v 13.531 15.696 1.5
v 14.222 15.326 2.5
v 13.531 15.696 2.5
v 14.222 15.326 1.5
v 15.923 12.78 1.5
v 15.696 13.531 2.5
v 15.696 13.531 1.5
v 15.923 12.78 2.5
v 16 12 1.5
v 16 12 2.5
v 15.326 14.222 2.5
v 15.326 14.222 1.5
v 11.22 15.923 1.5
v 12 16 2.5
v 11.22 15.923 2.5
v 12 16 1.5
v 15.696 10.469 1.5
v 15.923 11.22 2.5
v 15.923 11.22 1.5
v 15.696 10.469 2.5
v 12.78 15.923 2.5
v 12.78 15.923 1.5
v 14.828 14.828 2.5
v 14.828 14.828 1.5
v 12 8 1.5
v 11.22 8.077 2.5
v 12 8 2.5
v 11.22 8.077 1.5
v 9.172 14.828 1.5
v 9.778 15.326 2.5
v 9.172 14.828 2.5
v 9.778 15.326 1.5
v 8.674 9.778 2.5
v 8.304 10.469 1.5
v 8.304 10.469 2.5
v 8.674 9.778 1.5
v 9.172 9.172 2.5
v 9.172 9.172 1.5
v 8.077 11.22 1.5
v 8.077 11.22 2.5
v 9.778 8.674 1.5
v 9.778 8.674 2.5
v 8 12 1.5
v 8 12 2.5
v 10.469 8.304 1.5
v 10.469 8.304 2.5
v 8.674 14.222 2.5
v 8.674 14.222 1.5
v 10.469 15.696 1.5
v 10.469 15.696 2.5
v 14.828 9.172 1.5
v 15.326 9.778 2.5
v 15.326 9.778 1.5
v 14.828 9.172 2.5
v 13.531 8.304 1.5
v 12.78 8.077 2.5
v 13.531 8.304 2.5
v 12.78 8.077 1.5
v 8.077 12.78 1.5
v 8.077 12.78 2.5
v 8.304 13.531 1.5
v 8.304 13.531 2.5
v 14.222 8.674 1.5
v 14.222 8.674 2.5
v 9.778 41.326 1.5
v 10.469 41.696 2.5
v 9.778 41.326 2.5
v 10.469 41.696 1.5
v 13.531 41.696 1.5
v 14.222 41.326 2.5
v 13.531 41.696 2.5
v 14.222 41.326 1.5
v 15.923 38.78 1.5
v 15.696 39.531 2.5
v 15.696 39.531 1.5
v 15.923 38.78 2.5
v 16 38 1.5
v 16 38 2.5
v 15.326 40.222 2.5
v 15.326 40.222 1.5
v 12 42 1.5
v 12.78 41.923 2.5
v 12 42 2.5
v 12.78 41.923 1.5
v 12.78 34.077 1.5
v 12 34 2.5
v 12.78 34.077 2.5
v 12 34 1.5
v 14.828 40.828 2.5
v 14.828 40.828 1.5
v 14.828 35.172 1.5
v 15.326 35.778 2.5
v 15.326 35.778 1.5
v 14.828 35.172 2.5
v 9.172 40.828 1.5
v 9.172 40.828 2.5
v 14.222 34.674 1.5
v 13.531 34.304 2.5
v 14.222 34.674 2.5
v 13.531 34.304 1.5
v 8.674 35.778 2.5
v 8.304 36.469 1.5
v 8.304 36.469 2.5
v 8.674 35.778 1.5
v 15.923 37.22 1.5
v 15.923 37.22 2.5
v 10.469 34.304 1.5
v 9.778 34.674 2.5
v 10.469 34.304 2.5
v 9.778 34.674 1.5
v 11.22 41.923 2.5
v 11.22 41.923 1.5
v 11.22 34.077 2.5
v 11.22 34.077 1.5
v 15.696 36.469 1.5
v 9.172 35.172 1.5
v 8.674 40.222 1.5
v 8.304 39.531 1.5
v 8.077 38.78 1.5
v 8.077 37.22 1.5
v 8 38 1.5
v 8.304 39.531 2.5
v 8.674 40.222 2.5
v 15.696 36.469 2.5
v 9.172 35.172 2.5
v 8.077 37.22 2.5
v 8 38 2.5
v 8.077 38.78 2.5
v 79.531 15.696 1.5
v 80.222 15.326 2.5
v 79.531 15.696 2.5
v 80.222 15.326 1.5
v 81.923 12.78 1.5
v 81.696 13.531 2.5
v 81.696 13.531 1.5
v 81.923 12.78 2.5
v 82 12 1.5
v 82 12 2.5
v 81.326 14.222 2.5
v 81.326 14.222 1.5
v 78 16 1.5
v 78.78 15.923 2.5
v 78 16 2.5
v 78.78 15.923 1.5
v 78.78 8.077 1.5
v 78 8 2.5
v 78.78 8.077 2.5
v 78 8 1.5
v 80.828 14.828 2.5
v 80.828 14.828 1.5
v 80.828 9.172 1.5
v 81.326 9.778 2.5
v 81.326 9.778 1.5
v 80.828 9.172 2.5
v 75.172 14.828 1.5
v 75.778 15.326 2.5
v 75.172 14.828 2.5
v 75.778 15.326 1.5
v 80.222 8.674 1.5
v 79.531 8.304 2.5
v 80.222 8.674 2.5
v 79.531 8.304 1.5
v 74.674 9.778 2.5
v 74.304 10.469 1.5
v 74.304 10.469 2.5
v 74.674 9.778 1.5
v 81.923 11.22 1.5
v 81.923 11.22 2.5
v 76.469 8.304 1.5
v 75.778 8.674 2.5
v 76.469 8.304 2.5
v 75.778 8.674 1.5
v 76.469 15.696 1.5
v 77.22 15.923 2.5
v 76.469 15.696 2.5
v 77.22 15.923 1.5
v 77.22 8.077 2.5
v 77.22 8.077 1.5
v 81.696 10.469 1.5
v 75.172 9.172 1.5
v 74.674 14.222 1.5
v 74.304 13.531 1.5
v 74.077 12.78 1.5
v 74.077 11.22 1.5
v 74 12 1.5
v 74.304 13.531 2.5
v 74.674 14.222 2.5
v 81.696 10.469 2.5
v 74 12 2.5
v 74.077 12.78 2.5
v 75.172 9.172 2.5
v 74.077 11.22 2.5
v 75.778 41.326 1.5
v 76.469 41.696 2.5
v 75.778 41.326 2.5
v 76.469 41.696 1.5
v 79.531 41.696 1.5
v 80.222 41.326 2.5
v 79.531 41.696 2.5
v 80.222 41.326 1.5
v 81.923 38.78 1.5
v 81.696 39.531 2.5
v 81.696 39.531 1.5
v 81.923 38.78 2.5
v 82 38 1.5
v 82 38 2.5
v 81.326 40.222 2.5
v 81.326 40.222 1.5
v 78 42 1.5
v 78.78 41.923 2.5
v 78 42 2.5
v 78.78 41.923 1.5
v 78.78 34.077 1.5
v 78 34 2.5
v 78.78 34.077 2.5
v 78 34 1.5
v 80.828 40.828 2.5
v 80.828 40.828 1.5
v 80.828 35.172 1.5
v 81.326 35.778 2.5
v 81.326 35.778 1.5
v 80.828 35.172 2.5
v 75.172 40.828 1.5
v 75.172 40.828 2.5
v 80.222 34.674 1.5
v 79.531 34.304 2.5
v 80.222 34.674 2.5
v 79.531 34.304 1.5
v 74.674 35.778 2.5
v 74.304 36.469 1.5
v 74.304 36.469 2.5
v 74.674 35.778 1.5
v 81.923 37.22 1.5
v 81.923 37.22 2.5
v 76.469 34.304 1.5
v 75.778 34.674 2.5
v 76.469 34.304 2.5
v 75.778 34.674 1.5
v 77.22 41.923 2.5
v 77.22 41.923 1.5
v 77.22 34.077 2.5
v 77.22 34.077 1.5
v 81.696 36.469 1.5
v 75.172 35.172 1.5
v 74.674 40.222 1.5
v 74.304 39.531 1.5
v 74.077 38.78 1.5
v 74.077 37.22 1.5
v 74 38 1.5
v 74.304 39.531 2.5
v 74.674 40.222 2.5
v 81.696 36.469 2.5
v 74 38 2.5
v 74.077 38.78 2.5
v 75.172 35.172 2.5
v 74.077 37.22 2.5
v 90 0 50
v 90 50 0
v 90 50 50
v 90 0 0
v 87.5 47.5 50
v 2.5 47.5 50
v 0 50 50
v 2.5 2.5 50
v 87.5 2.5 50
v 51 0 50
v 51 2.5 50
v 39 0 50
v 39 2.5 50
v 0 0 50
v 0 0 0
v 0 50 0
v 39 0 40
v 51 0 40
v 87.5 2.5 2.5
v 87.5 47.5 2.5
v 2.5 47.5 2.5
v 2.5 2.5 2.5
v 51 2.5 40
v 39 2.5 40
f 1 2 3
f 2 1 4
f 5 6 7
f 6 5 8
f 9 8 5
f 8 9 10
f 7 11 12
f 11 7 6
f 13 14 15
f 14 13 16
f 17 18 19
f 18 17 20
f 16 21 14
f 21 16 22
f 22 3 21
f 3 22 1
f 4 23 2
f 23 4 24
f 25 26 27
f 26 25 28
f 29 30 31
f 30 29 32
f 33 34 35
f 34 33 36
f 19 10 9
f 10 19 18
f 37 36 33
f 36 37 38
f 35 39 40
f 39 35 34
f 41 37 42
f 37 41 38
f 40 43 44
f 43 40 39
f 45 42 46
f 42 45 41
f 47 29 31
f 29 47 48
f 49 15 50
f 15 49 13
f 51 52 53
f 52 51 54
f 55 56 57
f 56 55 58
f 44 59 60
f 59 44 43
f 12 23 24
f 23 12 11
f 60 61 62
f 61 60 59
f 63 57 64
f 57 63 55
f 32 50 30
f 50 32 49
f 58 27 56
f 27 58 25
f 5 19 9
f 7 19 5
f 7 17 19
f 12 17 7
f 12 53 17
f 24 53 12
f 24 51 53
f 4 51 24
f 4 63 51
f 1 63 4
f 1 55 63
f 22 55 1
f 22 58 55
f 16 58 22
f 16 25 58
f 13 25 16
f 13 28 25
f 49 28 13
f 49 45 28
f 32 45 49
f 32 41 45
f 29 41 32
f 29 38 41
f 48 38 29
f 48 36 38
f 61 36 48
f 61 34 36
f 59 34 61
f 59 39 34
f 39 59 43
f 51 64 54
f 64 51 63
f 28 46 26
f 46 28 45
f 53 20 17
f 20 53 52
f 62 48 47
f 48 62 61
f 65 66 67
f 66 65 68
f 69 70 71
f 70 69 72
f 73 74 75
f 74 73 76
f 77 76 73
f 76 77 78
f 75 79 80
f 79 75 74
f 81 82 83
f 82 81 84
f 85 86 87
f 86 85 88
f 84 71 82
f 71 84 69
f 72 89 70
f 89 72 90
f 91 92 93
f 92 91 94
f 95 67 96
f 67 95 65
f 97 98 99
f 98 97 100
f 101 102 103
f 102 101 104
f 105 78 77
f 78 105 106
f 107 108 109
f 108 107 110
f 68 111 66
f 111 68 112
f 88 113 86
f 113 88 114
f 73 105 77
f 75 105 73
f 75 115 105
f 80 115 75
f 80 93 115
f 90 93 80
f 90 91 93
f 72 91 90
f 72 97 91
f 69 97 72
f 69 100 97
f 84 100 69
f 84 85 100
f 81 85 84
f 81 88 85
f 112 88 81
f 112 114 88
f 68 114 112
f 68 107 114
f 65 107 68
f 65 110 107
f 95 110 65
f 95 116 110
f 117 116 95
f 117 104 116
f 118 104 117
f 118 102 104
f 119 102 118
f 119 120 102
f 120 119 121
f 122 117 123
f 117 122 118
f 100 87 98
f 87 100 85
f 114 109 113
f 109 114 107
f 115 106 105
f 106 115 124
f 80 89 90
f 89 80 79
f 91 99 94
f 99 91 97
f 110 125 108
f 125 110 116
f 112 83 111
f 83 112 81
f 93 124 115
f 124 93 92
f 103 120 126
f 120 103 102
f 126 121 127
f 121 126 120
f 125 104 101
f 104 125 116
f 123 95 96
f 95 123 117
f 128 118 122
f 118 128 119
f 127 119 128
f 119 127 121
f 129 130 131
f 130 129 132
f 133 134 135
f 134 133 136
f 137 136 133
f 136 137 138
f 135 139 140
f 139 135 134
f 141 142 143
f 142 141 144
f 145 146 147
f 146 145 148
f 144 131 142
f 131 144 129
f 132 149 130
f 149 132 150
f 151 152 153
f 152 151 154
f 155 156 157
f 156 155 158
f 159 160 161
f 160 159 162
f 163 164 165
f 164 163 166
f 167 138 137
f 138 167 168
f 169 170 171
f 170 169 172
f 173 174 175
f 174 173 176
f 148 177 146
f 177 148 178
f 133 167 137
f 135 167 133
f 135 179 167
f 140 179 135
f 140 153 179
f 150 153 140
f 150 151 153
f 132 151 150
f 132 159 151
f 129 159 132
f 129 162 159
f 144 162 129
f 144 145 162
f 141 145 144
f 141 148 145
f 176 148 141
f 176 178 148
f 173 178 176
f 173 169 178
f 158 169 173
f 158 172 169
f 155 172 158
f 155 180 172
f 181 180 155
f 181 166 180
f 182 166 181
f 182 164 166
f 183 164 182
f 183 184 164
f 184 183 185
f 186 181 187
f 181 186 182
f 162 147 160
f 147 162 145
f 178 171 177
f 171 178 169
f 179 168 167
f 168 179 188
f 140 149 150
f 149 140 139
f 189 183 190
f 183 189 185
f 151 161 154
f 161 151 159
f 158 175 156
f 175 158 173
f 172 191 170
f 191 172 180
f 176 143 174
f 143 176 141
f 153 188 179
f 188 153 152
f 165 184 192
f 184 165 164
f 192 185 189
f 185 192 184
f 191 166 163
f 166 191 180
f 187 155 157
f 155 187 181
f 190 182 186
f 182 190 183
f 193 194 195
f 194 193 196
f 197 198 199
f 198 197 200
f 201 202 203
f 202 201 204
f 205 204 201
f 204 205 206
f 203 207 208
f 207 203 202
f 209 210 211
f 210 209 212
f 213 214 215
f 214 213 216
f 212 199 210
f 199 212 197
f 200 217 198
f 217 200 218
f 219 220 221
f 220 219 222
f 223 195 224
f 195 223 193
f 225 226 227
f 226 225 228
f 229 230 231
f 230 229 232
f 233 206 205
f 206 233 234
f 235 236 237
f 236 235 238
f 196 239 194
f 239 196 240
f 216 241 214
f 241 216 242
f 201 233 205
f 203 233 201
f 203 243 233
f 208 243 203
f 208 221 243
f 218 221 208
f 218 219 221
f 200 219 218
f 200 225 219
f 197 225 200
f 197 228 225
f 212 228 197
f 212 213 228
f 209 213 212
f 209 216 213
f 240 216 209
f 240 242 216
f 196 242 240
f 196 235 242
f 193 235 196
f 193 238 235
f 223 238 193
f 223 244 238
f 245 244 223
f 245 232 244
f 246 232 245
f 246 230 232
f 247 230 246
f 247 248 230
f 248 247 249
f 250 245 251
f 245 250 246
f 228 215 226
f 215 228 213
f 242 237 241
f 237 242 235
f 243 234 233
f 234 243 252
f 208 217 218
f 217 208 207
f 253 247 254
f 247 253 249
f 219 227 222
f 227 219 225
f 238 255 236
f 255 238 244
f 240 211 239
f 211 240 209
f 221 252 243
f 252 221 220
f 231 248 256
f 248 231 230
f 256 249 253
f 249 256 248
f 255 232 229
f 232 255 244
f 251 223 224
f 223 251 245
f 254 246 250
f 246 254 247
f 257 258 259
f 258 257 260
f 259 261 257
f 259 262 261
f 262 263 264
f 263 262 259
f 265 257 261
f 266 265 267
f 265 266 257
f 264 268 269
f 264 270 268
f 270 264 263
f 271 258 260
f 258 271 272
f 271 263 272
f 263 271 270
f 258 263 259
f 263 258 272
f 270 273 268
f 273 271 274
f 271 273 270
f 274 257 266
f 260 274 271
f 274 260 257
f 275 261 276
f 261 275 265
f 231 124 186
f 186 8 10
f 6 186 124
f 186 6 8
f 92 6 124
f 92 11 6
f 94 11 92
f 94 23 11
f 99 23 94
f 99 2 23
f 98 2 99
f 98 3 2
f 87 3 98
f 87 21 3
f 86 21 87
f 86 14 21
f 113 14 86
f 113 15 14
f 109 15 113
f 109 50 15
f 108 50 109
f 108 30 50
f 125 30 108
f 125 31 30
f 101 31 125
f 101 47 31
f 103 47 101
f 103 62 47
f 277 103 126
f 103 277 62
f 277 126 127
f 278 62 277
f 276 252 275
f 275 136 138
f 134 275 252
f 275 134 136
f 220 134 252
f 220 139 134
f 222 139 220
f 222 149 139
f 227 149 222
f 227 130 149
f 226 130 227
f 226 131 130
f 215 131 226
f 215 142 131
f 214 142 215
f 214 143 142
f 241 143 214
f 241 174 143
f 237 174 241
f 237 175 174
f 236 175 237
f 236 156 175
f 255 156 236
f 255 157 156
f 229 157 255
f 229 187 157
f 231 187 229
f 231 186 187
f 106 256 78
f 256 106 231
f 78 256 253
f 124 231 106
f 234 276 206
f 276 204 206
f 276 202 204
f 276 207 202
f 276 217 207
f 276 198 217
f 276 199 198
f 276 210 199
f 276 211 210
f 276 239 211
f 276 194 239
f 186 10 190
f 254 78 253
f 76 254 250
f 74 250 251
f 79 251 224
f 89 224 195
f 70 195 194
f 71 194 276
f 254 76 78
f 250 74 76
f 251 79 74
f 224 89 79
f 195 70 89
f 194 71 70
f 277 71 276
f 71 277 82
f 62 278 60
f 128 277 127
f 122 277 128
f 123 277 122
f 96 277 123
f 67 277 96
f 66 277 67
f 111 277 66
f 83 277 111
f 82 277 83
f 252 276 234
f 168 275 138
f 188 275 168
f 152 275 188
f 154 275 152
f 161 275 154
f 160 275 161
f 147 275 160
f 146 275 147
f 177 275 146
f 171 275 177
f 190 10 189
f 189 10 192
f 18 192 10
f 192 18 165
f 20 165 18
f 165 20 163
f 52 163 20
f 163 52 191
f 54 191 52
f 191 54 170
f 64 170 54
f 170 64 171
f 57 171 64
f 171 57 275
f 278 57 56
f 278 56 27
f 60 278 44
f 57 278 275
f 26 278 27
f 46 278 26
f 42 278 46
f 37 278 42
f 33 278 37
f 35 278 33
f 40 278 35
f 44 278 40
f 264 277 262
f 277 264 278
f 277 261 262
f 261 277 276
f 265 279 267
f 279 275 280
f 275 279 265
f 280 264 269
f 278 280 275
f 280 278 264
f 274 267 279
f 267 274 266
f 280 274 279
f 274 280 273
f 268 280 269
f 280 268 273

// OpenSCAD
$fn = 32;

// ----------------------------------------------------------------------
// Enclosure box: both enclosure
// ----------------------------------------------------------------------

// --- parameters (mm) ---
box_l = 90;               // outer length, X
box_w = 50;               // outer width, Y
box_h = 50;               // outer height
wall_t = 2.5;             // wall thickness
boss_r = 4;               // corner boss radius
hole_r = 1.5;             // boss screw hole radius
boss_in = 12;             // boss inset from the corners
notch_w = 12;             // cable notch width
notch_h = 10;             // cable notch height

inner_h = box_h - wall_t;  // cavity depth
boss_h = inner_h - 2;  // corner boss height

difference() {
  cube([box_l, box_w, box_h]);
  translate([wall_t, wall_t, wall_t])
    cube([box_l - 2 * wall_t, box_w - 2 * wall_t, box_h]);
  for (sx = [0, 1], sy = [0, 1])
    translate([sx ? box_l - boss_in : boss_in,
               sy ? box_w - boss_in : boss_in, wall_t - 1]) {
      cylinder(r = boss_r, h = boss_h);
      translate([0, 0, boss_h - 4])
        cylinder(r = hole_r, h = 5);
    }
  translate([box_l / 2 - notch_w / 2, -1, box_h - notch_h])
    cube([notch_w, wall_t + 2, notch_h + 1]);
}
